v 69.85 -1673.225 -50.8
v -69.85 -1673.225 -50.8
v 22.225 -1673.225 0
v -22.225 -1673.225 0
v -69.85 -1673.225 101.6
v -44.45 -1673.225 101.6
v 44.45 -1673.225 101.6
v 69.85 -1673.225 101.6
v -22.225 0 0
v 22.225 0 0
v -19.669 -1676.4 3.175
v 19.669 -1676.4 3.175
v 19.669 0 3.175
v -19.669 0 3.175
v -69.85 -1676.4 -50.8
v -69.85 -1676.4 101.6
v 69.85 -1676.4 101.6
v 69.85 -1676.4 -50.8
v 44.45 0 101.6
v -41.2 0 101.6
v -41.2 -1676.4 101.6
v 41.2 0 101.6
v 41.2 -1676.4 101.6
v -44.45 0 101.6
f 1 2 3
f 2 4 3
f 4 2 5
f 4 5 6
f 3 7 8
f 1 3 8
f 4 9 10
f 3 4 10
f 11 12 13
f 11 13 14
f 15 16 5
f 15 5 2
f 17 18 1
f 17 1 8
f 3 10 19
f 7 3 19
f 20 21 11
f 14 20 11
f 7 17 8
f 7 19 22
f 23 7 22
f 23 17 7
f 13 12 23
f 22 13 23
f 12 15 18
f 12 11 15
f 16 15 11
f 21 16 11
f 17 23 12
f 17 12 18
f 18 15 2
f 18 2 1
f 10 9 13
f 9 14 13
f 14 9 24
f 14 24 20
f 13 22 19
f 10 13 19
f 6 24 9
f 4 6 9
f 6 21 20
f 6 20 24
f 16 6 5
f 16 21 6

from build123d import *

# Parameters (mm, degrees)
F1_DEPTH = 1676.4
F2_T     = -3.175
F3_DEPTH = 25.4
F4_DEPTH = 25.4
F6_DEPTH = 3.175


with BuildPart() as f1:
    # F0 (on Front) → F1 (new body)
    with BuildSketch(Plane.XZ):
        Polygon((-22.225, 0), (0, 0), (22.225, 0), (44.45, 101.6), (-44.45, 101.6), align=None)
    extrude(amount=F1_DEPTH)

    # F2
    f2_openings = [f1.faces().sort_by_distance(p)[0] for p in [
        (0, -838.2, 101.6),
    ]]
    offset(amount=F2_T, openings=f2_openings)

    # F3 (cut): a face of the model
    f3_faces = [f1.faces().sort_by_distance(p)[0] for p in [
        (0, -1673.225, 58.1899151132),
    ]]
    extrude(f3_faces, amount=-F3_DEPTH, mode=Mode.SUBTRACT)

    # F4 (cut): a face of the model
    f4_faces = [f1.faces().sort_by_distance(p)[0] for p in [
        (0, -3.175, 58.1899151132),
    ]]
    extrude(f4_faces, amount=-F4_DEPTH, mode=Mode.SUBTRACT)

    # F5 (on face) → F6 (join)
    with BuildSketch(Plane.XZ.offset(1676.4)):
        Polygon((69.85, 101.6), (44.45, 101.6), (22.225, 0), (-22.225, 0), (-44.45, 101.6), (-69.85, 101.6), (-69.85, -50.8), (69.85, -50.8), align=None)
    extrude(amount=-F6_DEPTH)


solid = f1.part
